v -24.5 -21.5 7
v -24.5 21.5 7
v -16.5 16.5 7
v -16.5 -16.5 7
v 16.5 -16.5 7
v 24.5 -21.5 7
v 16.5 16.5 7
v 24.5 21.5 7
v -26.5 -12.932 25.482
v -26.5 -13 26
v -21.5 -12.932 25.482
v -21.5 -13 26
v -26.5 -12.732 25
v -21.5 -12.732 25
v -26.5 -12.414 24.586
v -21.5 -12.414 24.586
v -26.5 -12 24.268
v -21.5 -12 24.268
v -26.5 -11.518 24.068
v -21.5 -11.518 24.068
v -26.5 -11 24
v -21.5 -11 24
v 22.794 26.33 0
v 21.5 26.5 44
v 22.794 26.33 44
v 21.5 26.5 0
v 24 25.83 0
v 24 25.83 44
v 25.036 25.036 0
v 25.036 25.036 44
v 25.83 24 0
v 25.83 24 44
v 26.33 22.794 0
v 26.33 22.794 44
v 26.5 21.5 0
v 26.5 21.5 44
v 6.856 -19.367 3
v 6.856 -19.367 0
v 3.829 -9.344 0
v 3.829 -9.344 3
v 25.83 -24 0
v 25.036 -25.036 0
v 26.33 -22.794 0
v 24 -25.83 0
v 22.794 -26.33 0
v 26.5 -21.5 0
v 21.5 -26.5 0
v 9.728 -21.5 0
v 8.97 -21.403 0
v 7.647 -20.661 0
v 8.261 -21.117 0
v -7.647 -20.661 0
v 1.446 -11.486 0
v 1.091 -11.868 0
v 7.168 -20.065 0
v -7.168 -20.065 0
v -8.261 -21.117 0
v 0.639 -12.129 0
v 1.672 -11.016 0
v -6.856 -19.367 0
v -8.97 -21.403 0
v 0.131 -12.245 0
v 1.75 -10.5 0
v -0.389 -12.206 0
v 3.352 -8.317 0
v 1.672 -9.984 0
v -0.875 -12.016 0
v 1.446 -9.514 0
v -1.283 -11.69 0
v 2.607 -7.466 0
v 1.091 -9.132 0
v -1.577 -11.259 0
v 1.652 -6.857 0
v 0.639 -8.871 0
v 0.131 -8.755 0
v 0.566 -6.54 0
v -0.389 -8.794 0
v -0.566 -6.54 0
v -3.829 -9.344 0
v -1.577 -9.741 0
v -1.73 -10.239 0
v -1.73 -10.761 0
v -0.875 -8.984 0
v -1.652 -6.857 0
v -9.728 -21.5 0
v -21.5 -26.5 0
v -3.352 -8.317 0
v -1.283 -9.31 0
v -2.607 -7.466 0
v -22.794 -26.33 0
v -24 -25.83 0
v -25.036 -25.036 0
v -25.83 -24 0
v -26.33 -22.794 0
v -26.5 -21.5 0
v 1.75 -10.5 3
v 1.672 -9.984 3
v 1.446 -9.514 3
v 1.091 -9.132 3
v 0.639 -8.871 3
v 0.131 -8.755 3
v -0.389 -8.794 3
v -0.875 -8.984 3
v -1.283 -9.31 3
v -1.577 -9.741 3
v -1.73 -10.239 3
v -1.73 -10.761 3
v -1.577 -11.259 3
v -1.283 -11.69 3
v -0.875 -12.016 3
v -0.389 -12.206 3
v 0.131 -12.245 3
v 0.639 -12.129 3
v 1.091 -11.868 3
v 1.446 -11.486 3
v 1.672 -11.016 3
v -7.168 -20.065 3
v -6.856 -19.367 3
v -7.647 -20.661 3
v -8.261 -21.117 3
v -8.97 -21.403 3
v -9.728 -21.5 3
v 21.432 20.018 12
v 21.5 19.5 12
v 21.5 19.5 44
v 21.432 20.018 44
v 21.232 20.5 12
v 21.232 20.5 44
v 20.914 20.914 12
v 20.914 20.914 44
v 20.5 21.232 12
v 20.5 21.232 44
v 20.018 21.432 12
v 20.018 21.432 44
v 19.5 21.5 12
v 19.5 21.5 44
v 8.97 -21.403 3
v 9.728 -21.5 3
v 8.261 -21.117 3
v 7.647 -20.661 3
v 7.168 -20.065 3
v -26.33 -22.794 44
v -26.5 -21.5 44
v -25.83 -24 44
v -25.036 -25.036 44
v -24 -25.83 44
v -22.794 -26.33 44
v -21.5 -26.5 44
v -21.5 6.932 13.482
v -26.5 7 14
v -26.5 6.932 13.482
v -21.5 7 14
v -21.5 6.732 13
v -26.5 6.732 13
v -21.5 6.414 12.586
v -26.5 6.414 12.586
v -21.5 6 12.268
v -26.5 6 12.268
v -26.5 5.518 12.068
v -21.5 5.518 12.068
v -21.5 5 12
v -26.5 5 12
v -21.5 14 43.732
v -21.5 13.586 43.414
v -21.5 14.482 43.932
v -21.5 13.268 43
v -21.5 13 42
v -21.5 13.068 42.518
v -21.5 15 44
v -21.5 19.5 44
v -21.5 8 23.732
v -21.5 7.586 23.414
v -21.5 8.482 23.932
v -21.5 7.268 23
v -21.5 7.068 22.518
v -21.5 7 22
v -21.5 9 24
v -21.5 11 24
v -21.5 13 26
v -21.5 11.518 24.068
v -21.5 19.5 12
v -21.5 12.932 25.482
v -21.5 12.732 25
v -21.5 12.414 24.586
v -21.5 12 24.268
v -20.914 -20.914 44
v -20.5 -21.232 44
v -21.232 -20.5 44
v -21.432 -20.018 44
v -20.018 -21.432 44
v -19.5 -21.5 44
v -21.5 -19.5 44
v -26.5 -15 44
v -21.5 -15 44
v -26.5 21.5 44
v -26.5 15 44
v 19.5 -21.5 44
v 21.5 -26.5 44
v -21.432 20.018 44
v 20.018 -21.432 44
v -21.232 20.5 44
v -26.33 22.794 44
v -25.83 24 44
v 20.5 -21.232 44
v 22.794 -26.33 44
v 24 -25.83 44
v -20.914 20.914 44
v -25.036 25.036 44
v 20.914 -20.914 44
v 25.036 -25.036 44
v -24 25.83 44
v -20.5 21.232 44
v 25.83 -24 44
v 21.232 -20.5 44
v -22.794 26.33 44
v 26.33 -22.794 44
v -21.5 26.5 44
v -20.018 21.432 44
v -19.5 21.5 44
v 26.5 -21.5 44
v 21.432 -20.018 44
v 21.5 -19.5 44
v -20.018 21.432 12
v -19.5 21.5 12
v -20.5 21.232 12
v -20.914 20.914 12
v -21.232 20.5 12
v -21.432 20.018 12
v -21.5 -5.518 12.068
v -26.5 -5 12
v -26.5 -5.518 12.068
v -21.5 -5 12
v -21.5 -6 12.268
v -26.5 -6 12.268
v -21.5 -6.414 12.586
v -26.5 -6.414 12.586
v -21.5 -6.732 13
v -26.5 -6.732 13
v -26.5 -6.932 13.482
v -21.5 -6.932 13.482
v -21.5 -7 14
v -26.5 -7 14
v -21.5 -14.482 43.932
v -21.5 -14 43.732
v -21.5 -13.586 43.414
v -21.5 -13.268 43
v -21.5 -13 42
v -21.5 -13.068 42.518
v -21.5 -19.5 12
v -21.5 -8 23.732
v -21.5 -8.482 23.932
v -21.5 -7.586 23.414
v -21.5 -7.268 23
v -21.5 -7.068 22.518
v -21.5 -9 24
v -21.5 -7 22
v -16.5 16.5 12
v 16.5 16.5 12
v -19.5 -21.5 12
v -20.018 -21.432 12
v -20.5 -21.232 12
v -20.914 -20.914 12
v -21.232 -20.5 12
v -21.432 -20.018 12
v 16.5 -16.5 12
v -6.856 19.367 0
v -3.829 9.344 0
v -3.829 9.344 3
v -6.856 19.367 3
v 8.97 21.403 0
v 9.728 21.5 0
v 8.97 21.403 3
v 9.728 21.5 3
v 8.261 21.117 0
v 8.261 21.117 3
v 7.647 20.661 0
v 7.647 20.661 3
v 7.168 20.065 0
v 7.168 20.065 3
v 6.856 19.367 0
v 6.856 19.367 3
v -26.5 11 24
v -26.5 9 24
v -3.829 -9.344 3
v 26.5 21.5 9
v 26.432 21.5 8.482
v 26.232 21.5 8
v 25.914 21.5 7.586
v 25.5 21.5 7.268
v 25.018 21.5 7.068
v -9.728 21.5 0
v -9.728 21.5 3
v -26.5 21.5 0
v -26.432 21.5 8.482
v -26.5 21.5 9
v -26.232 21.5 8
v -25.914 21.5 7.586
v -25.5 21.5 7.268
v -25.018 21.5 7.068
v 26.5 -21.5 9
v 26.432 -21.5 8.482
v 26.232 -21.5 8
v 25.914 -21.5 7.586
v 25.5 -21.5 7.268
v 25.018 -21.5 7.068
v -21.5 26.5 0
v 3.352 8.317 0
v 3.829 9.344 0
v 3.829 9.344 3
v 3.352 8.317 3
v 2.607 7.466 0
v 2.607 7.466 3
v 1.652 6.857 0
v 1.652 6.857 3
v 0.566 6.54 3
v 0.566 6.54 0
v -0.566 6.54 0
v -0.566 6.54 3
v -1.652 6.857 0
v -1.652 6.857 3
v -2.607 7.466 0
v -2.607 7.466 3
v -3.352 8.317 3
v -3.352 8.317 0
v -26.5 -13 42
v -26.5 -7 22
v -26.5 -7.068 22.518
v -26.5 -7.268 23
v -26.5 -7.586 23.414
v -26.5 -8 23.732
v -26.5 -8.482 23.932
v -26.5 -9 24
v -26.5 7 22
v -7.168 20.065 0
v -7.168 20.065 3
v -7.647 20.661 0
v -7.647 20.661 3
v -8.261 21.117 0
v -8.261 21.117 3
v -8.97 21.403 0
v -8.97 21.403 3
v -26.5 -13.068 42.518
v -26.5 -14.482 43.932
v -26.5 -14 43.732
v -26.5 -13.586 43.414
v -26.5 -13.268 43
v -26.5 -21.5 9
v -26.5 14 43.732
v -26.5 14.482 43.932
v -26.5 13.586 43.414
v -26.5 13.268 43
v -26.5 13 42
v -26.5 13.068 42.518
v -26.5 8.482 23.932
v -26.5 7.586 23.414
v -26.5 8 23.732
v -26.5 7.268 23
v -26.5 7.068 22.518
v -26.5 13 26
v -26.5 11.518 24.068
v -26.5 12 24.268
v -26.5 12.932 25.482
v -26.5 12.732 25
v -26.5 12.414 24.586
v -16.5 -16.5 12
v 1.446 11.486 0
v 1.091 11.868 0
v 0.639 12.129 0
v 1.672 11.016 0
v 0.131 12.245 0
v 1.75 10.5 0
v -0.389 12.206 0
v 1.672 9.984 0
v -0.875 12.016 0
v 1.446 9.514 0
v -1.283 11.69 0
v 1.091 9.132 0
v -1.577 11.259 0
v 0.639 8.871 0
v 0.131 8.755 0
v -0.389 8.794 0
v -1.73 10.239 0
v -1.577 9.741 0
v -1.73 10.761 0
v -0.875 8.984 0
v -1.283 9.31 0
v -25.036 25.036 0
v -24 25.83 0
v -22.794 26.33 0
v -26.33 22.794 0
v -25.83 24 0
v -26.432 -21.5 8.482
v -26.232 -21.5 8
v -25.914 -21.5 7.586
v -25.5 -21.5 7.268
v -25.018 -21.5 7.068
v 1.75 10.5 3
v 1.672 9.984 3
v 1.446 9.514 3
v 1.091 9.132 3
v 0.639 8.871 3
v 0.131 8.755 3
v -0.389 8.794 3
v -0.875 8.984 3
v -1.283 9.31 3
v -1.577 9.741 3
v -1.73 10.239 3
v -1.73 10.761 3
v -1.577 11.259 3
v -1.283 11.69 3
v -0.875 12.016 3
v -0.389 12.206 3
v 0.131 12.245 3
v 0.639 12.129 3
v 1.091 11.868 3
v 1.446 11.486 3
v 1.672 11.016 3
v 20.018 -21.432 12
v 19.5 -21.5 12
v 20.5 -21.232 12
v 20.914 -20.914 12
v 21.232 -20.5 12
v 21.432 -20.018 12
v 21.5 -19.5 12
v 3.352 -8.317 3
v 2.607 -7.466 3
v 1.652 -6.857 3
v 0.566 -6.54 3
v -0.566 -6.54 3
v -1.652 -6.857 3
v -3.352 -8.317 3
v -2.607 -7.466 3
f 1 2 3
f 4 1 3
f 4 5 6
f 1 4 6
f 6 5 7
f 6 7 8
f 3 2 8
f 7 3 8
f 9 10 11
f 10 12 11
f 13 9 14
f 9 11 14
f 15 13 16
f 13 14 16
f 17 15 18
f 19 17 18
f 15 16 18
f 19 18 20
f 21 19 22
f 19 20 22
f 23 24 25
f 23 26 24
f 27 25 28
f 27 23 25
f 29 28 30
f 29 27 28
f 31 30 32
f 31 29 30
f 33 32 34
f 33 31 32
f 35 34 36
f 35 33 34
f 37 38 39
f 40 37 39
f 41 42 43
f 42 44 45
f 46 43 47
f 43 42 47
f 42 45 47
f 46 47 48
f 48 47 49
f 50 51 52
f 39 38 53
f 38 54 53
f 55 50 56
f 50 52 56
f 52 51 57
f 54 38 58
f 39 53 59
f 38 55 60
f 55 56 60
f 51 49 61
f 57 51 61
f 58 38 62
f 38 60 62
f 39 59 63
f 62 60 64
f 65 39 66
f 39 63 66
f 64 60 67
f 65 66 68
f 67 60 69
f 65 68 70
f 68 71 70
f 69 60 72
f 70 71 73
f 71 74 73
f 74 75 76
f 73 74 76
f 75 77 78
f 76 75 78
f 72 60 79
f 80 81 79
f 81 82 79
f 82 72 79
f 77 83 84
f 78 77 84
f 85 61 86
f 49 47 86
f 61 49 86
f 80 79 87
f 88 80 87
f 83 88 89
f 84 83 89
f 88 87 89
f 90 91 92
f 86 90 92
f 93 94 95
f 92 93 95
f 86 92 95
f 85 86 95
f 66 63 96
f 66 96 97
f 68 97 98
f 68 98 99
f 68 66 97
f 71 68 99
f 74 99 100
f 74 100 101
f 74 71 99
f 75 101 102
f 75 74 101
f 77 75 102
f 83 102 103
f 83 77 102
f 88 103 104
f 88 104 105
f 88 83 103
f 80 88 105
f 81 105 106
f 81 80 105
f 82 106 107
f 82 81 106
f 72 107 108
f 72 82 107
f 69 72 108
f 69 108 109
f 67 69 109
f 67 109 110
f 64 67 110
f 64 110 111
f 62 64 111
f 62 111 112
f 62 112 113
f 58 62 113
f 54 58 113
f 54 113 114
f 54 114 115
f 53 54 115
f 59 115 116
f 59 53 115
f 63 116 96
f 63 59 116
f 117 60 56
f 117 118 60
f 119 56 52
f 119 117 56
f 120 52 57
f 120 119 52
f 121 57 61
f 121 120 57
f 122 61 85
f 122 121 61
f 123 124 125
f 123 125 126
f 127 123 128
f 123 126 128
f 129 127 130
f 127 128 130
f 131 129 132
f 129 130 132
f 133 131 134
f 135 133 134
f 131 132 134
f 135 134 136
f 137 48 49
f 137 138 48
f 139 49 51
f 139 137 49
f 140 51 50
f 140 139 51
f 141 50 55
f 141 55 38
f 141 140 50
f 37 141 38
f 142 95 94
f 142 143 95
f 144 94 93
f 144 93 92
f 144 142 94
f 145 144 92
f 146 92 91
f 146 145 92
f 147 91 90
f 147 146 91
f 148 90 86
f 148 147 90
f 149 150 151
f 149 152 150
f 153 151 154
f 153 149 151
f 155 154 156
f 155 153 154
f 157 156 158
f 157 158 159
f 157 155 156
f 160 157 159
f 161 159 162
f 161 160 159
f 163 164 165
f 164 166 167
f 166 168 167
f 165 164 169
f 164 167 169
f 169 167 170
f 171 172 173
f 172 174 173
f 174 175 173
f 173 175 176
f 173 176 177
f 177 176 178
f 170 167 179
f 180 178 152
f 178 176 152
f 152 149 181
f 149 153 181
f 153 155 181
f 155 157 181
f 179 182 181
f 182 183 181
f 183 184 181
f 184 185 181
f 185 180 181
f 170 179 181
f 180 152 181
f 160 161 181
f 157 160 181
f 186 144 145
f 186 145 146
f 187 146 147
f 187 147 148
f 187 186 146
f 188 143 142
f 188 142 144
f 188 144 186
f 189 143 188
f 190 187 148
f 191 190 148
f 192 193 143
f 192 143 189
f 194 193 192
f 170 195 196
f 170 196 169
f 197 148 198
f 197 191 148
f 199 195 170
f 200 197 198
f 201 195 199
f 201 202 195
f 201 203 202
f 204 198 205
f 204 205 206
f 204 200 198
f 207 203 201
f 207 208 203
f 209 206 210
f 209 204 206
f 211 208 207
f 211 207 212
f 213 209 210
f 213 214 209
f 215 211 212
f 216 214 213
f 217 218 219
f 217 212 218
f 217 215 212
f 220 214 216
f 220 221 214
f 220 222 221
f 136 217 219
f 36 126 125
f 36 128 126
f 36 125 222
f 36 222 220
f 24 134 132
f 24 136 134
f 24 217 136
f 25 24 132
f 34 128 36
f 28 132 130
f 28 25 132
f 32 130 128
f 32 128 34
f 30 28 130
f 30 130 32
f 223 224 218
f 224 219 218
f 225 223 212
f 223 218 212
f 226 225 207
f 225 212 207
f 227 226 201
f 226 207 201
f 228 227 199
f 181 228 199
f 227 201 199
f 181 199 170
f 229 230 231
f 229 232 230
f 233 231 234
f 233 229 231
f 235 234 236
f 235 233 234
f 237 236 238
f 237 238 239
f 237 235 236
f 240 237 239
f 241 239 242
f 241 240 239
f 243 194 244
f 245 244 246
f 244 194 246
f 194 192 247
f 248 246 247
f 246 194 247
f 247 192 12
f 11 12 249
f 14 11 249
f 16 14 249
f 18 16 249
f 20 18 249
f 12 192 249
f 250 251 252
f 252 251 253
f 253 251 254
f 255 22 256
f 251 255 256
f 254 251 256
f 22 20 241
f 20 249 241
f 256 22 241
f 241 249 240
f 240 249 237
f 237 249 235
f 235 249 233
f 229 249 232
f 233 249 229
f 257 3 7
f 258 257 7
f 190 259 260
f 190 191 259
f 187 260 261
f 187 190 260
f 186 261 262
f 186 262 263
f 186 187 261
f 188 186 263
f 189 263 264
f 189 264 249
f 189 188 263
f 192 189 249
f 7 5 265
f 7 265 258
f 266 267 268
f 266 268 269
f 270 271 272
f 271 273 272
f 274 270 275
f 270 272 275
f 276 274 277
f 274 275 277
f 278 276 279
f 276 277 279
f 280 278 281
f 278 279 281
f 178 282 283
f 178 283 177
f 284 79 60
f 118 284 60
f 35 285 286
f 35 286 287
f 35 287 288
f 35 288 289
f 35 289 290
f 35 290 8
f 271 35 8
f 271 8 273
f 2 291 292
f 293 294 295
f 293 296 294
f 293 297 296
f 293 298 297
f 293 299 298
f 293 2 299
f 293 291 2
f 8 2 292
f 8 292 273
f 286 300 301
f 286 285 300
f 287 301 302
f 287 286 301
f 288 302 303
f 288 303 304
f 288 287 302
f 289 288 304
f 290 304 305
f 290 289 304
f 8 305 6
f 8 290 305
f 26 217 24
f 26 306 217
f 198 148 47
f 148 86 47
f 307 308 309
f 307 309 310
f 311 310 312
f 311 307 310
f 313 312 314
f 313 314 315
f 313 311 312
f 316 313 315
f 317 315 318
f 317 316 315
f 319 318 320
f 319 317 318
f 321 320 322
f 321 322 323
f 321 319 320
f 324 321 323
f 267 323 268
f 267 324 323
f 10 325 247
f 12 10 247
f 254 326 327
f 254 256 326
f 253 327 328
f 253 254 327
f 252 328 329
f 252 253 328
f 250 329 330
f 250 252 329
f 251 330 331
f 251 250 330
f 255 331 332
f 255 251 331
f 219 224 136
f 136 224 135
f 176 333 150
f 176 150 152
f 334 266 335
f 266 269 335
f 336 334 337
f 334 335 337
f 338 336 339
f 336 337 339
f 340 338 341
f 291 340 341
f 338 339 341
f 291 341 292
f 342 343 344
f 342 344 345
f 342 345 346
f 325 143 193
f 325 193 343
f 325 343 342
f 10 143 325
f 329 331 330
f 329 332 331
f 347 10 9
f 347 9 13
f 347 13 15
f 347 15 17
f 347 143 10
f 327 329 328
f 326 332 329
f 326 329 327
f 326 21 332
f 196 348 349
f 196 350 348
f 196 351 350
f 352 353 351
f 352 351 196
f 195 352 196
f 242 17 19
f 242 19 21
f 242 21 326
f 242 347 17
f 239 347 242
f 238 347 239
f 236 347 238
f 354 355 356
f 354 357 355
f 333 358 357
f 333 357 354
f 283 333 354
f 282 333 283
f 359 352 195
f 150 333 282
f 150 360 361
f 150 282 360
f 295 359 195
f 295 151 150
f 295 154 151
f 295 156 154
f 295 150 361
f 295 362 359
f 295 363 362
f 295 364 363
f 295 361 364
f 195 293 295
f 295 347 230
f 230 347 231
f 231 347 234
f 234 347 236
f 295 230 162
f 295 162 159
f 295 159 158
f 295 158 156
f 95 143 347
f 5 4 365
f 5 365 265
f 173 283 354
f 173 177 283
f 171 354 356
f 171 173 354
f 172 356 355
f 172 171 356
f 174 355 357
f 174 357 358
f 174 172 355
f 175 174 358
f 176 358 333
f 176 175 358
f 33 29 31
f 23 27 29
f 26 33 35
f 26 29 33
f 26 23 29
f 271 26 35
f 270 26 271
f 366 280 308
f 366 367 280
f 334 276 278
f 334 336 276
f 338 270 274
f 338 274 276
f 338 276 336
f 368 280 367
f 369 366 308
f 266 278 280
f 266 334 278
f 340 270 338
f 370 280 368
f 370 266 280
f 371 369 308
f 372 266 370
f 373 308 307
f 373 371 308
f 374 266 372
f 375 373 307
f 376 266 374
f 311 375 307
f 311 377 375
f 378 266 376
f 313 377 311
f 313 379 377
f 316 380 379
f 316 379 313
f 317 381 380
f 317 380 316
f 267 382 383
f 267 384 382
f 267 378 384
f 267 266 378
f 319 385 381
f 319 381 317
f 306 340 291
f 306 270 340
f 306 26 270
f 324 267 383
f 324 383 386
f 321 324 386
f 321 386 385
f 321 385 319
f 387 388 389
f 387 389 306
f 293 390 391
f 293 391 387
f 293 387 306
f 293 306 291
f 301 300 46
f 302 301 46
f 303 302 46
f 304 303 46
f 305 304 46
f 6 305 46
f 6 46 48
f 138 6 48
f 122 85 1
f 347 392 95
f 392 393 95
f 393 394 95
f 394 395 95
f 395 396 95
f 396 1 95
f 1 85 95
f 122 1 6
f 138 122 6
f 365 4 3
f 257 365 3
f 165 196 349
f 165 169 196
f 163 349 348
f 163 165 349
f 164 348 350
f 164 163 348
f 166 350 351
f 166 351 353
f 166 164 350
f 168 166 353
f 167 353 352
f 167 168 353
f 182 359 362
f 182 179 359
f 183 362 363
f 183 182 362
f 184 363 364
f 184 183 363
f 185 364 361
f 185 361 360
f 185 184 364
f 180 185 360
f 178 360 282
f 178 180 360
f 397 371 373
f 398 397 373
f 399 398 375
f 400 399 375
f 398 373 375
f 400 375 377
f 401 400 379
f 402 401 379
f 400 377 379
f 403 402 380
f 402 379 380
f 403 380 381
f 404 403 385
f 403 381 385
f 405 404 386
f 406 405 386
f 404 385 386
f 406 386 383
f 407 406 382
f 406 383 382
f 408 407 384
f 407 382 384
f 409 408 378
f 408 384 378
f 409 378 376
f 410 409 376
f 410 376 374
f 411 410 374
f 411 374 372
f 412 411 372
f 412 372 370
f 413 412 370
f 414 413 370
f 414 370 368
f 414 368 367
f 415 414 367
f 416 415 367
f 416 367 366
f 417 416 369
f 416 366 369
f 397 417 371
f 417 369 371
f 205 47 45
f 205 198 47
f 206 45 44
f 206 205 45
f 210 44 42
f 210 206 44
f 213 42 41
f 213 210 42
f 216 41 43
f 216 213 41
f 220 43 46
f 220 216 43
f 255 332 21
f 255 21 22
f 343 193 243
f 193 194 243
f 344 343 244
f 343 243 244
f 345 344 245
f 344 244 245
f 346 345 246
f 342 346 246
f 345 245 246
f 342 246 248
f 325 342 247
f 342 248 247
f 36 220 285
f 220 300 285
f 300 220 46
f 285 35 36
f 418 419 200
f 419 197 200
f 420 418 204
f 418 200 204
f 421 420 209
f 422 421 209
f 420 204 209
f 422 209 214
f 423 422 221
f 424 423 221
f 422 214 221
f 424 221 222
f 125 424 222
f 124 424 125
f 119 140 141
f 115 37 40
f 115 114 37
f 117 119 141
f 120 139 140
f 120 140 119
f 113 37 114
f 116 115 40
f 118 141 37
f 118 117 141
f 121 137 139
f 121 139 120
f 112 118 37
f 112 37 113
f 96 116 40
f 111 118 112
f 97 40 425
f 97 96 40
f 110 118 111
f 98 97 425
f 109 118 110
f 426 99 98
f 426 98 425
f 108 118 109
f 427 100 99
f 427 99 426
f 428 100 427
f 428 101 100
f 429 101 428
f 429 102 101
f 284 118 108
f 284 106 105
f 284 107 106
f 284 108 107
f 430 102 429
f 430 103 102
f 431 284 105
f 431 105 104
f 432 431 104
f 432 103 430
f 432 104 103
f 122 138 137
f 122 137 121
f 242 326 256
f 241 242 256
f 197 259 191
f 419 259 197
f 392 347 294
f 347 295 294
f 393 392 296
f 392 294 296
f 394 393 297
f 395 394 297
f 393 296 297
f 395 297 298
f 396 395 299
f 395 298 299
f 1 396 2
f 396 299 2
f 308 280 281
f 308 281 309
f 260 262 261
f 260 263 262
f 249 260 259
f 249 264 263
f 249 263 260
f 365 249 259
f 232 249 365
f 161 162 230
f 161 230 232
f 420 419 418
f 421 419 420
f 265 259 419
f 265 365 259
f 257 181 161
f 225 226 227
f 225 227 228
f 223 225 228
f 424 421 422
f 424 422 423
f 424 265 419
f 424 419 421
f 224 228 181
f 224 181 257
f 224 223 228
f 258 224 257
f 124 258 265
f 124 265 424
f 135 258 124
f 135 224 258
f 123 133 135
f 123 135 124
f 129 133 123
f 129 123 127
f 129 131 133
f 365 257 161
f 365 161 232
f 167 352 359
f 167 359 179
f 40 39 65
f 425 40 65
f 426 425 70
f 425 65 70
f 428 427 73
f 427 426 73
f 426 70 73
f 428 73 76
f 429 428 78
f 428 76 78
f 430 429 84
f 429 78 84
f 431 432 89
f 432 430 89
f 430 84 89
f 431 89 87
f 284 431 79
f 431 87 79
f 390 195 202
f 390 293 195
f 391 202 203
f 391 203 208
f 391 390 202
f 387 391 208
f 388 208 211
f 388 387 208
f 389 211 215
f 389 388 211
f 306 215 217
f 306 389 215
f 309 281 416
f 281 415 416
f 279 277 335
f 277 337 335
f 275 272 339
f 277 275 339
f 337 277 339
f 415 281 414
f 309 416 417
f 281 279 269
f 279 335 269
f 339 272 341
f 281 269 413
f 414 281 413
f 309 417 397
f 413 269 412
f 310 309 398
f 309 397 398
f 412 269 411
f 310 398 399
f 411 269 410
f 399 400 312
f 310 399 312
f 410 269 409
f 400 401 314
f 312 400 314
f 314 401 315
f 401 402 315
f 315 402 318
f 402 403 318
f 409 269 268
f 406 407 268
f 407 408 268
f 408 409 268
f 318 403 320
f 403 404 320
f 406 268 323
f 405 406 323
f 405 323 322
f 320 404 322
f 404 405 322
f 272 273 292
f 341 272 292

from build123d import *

# Parameters (mm, degrees)
CROQUIS1_W                = 5
CROQUIS1_H                = 53
SALIENTE_EXTRUIR1_DEPTH   = 7
SALIENTE_EXTRUIR1_2_DEPTH = 7
CROQUIS3_W                = 53
CROQUIS3_H                = 48
CROQUIS3_W_2              = 33
CROQUIS3_H_2              = 33
CROQUIS3_H_3              = 5
SALIENTE_EXTRUIR2_DEPTH   = 5
CROQUIS4_W                = 53
CROQUIS4_H                = 53
CROQUIS4_W_2              = 43
CROQUIS4_H_2              = 43
SALIENTE_EXTRUIR3_DEPTH   = 32
REDONDEO1_R               = 2
REDONDEO2_R               = 5
CROQUIS5_W                = 5
CROQUIS5_H                = 14
CORTAR_EXTRUIR1_DEPTH     = 32
CROQUIS6_W                = 5
CROQUIS6_H                = 6
CORTAR_EXTRUIR2_DEPTH     = 20
REDONDEO3_R               = 2
CROQUIS7_R                = 4
CROQUIS7_R_2              = 1.75
SALIENTE_EXTRUIR4_DEPTH   = 3
REDONDEO4_R               = 3
REDONDEO7_R               = 3


with BuildPart() as part:
    # Croquis1 → Saliente-Extruir1 (new body)
    with BuildSketch(Plane(origin=(0, 0, 0), x_dir=(0, 1, 0), z_dir=(0, 0, 1))):
        with Locations((-24, 0)):
            Rectangle(CROQUIS1_W, CROQUIS1_H)
    extrude(amount=SALIENTE_EXTRUIR1_DEPTH)



with BuildPart() as body_2:
    # Croquis1 → Saliente-Extruir1 2 (new body)
    with BuildSketch(Plane(origin=(0, 0, 0), x_dir=(0, 1, 0), z_dir=(0, 0, 1))):
        with Locations((24, 0)):
            Rectangle(CROQUIS1_W, CROQUIS1_H)
    extrude(amount=SALIENTE_EXTRUIR1_2_DEPTH)


with BuildPart() as part_1:
    add(part.part)

    add(body_2.part)  # Saliente-Extruir2 merges body 2
    # Croquis3 → Saliente-Extruir2 (add)
    # profile 1 of 2: a face of its own
    with BuildSketch(Plane.XY.offset(7)):
        with Locations((0, 2.5)):
            Rectangle(CROQUIS3_W, CROQUIS3_H)
        Rectangle(CROQUIS3_W_2, CROQUIS3_H_2, mode=Mode.SUBTRACT)
    # profile 2 of 2: a face of its own
    with BuildSketch(Plane.XY.offset(7)):
        with Locations((0, -24)):
            Rectangle(CROQUIS3_W, CROQUIS3_H_3)
    extrude(amount=SALIENTE_EXTRUIR2_DEPTH)

    # Croquis4 → Saliente-Extruir3 (add)
    with BuildSketch(Plane.XY.offset(12)):
        Rectangle(CROQUIS4_W, CROQUIS4_H)
        Rectangle(CROQUIS4_W_2, CROQUIS4_H_2, mode=Mode.SUBTRACT)
    extrude(amount=SALIENTE_EXTRUIR3_DEPTH)

    # Redondeo1
    redondeo1_edges = [part_1.edges().sort_by_distance(p)[0] for p in [
        (21.5, 21.5, 28),
        (-21.5, 21.5, 28),
        (-21.5, -21.5, 28),
        (21.5, -21.5, 28),
    ]]
    fillet(redondeo1_edges, radius=REDONDEO1_R)

    # Redondeo2
    redondeo2_edges = [part_1.edges().sort_by_distance(p)[0] for p in [
        (-26.5, 26.5, 22),
        (26.5, 26.5, 22),
        (26.5, -26.5, 22),
        (-26.5, -26.5, 22),
    ]]
    fillet(redondeo2_edges, radius=REDONDEO2_R - 0.0001)  # a hair under: the kernel refuses the full size

    # Croquis5 → Cortar-Extruir1 (cut)
    with BuildSketch(Plane.XY.offset(44)):
        with Locations((-24, 0)):
            Rectangle(CROQUIS5_W, CROQUIS5_H)
    extrude(amount=-CORTAR_EXTRUIR1_DEPTH, mode=Mode.SUBTRACT)

    # Croquis6 → Cortar-Extruir2 (cut)
    with BuildSketch(Plane.XY.offset(44)):
        with Locations((-24, 10)):
            Rectangle(CROQUIS6_W, CROQUIS6_H)
        with Locations((-24, -10)):
            Rectangle(CROQUIS6_W, CROQUIS6_H)
    extrude(amount=-CORTAR_EXTRUIR2_DEPTH, mode=Mode.SUBTRACT)

    # Redondeo3
    redondeo3_edges = [part_1.edges().sort_by_distance(p)[0] for p in [
        (-24, 7, 12),
        (-24, -7, 12),
        (-24, -13, 24),
        (-24, -7, 24),
        (-24, -13, 44),
        (-24, 13, 44),
        (-24, 7, 24),
        (-24, 13, 24),
        (-26.5, 0, 7),
        (26.5, 0, 7),
    ]]
    fillet(redondeo3_edges, radius=REDONDEO3_R)

    # Croquis7 → Saliente-Extruir4 (add)
    # profile 1 of 2: a face of its own
    with BuildSketch(Plane(origin=(0, 0, 0), x_dir=(0, 1, 0), z_dir=(0, 0, 1))):
        with BuildLine():
            Line((-21.5, 7.5), (-21.5, -7.5))
            Line((-21.5, -7.5), (-9.343708023, -3.829228233))
            ThreePointArc((-9.343708023, -3.829228233), (-14.5, 0), (-9.343708023, 3.829228233))
            Line((-9.343708023, 3.829228233), (-21.5, 7.5))
        make_face()
    # profile 2 of 2: a face of its own
    with BuildSketch(Plane(origin=(0, 0, 0), x_dir=(0, 1, 0), z_dir=(0, 0, 1))):
        with Locations((-10.5, 0)):
            Circle(CROQUIS7_R)
        with Locations(Location((-10.5, 0, 0), (0, 0, 270))):
            Circle(CROQUIS7_R_2, mode=Mode.SUBTRACT)
    saliente_extruir4 = extrude(amount=SALIENTE_EXTRUIR4_DEPTH)

    # Redondeo4
    redondeo4_edges = [part_1.edges().sort_by_distance(p)[0] for p in [
        (7.5, -21.5, 1.5),
        (-7.5, -21.5, 1.5),
    ]]
    fillet(redondeo4_edges, radius=REDONDEO4_R)

    # Simetría5: Saliente-Extruir4 across plane
    add(saliente_extruir4.mirror(Plane.ZX))

    # Redondeo7
    redondeo7_edges = [part_1.edges().sort_by_distance(p)[0] for p in [
        (7.5, 21.5, 1.5),
        (-7.5, 21.5, 1.5),
    ]]
    fillet(redondeo7_edges, radius=REDONDEO7_R)


solid = part_1.part
